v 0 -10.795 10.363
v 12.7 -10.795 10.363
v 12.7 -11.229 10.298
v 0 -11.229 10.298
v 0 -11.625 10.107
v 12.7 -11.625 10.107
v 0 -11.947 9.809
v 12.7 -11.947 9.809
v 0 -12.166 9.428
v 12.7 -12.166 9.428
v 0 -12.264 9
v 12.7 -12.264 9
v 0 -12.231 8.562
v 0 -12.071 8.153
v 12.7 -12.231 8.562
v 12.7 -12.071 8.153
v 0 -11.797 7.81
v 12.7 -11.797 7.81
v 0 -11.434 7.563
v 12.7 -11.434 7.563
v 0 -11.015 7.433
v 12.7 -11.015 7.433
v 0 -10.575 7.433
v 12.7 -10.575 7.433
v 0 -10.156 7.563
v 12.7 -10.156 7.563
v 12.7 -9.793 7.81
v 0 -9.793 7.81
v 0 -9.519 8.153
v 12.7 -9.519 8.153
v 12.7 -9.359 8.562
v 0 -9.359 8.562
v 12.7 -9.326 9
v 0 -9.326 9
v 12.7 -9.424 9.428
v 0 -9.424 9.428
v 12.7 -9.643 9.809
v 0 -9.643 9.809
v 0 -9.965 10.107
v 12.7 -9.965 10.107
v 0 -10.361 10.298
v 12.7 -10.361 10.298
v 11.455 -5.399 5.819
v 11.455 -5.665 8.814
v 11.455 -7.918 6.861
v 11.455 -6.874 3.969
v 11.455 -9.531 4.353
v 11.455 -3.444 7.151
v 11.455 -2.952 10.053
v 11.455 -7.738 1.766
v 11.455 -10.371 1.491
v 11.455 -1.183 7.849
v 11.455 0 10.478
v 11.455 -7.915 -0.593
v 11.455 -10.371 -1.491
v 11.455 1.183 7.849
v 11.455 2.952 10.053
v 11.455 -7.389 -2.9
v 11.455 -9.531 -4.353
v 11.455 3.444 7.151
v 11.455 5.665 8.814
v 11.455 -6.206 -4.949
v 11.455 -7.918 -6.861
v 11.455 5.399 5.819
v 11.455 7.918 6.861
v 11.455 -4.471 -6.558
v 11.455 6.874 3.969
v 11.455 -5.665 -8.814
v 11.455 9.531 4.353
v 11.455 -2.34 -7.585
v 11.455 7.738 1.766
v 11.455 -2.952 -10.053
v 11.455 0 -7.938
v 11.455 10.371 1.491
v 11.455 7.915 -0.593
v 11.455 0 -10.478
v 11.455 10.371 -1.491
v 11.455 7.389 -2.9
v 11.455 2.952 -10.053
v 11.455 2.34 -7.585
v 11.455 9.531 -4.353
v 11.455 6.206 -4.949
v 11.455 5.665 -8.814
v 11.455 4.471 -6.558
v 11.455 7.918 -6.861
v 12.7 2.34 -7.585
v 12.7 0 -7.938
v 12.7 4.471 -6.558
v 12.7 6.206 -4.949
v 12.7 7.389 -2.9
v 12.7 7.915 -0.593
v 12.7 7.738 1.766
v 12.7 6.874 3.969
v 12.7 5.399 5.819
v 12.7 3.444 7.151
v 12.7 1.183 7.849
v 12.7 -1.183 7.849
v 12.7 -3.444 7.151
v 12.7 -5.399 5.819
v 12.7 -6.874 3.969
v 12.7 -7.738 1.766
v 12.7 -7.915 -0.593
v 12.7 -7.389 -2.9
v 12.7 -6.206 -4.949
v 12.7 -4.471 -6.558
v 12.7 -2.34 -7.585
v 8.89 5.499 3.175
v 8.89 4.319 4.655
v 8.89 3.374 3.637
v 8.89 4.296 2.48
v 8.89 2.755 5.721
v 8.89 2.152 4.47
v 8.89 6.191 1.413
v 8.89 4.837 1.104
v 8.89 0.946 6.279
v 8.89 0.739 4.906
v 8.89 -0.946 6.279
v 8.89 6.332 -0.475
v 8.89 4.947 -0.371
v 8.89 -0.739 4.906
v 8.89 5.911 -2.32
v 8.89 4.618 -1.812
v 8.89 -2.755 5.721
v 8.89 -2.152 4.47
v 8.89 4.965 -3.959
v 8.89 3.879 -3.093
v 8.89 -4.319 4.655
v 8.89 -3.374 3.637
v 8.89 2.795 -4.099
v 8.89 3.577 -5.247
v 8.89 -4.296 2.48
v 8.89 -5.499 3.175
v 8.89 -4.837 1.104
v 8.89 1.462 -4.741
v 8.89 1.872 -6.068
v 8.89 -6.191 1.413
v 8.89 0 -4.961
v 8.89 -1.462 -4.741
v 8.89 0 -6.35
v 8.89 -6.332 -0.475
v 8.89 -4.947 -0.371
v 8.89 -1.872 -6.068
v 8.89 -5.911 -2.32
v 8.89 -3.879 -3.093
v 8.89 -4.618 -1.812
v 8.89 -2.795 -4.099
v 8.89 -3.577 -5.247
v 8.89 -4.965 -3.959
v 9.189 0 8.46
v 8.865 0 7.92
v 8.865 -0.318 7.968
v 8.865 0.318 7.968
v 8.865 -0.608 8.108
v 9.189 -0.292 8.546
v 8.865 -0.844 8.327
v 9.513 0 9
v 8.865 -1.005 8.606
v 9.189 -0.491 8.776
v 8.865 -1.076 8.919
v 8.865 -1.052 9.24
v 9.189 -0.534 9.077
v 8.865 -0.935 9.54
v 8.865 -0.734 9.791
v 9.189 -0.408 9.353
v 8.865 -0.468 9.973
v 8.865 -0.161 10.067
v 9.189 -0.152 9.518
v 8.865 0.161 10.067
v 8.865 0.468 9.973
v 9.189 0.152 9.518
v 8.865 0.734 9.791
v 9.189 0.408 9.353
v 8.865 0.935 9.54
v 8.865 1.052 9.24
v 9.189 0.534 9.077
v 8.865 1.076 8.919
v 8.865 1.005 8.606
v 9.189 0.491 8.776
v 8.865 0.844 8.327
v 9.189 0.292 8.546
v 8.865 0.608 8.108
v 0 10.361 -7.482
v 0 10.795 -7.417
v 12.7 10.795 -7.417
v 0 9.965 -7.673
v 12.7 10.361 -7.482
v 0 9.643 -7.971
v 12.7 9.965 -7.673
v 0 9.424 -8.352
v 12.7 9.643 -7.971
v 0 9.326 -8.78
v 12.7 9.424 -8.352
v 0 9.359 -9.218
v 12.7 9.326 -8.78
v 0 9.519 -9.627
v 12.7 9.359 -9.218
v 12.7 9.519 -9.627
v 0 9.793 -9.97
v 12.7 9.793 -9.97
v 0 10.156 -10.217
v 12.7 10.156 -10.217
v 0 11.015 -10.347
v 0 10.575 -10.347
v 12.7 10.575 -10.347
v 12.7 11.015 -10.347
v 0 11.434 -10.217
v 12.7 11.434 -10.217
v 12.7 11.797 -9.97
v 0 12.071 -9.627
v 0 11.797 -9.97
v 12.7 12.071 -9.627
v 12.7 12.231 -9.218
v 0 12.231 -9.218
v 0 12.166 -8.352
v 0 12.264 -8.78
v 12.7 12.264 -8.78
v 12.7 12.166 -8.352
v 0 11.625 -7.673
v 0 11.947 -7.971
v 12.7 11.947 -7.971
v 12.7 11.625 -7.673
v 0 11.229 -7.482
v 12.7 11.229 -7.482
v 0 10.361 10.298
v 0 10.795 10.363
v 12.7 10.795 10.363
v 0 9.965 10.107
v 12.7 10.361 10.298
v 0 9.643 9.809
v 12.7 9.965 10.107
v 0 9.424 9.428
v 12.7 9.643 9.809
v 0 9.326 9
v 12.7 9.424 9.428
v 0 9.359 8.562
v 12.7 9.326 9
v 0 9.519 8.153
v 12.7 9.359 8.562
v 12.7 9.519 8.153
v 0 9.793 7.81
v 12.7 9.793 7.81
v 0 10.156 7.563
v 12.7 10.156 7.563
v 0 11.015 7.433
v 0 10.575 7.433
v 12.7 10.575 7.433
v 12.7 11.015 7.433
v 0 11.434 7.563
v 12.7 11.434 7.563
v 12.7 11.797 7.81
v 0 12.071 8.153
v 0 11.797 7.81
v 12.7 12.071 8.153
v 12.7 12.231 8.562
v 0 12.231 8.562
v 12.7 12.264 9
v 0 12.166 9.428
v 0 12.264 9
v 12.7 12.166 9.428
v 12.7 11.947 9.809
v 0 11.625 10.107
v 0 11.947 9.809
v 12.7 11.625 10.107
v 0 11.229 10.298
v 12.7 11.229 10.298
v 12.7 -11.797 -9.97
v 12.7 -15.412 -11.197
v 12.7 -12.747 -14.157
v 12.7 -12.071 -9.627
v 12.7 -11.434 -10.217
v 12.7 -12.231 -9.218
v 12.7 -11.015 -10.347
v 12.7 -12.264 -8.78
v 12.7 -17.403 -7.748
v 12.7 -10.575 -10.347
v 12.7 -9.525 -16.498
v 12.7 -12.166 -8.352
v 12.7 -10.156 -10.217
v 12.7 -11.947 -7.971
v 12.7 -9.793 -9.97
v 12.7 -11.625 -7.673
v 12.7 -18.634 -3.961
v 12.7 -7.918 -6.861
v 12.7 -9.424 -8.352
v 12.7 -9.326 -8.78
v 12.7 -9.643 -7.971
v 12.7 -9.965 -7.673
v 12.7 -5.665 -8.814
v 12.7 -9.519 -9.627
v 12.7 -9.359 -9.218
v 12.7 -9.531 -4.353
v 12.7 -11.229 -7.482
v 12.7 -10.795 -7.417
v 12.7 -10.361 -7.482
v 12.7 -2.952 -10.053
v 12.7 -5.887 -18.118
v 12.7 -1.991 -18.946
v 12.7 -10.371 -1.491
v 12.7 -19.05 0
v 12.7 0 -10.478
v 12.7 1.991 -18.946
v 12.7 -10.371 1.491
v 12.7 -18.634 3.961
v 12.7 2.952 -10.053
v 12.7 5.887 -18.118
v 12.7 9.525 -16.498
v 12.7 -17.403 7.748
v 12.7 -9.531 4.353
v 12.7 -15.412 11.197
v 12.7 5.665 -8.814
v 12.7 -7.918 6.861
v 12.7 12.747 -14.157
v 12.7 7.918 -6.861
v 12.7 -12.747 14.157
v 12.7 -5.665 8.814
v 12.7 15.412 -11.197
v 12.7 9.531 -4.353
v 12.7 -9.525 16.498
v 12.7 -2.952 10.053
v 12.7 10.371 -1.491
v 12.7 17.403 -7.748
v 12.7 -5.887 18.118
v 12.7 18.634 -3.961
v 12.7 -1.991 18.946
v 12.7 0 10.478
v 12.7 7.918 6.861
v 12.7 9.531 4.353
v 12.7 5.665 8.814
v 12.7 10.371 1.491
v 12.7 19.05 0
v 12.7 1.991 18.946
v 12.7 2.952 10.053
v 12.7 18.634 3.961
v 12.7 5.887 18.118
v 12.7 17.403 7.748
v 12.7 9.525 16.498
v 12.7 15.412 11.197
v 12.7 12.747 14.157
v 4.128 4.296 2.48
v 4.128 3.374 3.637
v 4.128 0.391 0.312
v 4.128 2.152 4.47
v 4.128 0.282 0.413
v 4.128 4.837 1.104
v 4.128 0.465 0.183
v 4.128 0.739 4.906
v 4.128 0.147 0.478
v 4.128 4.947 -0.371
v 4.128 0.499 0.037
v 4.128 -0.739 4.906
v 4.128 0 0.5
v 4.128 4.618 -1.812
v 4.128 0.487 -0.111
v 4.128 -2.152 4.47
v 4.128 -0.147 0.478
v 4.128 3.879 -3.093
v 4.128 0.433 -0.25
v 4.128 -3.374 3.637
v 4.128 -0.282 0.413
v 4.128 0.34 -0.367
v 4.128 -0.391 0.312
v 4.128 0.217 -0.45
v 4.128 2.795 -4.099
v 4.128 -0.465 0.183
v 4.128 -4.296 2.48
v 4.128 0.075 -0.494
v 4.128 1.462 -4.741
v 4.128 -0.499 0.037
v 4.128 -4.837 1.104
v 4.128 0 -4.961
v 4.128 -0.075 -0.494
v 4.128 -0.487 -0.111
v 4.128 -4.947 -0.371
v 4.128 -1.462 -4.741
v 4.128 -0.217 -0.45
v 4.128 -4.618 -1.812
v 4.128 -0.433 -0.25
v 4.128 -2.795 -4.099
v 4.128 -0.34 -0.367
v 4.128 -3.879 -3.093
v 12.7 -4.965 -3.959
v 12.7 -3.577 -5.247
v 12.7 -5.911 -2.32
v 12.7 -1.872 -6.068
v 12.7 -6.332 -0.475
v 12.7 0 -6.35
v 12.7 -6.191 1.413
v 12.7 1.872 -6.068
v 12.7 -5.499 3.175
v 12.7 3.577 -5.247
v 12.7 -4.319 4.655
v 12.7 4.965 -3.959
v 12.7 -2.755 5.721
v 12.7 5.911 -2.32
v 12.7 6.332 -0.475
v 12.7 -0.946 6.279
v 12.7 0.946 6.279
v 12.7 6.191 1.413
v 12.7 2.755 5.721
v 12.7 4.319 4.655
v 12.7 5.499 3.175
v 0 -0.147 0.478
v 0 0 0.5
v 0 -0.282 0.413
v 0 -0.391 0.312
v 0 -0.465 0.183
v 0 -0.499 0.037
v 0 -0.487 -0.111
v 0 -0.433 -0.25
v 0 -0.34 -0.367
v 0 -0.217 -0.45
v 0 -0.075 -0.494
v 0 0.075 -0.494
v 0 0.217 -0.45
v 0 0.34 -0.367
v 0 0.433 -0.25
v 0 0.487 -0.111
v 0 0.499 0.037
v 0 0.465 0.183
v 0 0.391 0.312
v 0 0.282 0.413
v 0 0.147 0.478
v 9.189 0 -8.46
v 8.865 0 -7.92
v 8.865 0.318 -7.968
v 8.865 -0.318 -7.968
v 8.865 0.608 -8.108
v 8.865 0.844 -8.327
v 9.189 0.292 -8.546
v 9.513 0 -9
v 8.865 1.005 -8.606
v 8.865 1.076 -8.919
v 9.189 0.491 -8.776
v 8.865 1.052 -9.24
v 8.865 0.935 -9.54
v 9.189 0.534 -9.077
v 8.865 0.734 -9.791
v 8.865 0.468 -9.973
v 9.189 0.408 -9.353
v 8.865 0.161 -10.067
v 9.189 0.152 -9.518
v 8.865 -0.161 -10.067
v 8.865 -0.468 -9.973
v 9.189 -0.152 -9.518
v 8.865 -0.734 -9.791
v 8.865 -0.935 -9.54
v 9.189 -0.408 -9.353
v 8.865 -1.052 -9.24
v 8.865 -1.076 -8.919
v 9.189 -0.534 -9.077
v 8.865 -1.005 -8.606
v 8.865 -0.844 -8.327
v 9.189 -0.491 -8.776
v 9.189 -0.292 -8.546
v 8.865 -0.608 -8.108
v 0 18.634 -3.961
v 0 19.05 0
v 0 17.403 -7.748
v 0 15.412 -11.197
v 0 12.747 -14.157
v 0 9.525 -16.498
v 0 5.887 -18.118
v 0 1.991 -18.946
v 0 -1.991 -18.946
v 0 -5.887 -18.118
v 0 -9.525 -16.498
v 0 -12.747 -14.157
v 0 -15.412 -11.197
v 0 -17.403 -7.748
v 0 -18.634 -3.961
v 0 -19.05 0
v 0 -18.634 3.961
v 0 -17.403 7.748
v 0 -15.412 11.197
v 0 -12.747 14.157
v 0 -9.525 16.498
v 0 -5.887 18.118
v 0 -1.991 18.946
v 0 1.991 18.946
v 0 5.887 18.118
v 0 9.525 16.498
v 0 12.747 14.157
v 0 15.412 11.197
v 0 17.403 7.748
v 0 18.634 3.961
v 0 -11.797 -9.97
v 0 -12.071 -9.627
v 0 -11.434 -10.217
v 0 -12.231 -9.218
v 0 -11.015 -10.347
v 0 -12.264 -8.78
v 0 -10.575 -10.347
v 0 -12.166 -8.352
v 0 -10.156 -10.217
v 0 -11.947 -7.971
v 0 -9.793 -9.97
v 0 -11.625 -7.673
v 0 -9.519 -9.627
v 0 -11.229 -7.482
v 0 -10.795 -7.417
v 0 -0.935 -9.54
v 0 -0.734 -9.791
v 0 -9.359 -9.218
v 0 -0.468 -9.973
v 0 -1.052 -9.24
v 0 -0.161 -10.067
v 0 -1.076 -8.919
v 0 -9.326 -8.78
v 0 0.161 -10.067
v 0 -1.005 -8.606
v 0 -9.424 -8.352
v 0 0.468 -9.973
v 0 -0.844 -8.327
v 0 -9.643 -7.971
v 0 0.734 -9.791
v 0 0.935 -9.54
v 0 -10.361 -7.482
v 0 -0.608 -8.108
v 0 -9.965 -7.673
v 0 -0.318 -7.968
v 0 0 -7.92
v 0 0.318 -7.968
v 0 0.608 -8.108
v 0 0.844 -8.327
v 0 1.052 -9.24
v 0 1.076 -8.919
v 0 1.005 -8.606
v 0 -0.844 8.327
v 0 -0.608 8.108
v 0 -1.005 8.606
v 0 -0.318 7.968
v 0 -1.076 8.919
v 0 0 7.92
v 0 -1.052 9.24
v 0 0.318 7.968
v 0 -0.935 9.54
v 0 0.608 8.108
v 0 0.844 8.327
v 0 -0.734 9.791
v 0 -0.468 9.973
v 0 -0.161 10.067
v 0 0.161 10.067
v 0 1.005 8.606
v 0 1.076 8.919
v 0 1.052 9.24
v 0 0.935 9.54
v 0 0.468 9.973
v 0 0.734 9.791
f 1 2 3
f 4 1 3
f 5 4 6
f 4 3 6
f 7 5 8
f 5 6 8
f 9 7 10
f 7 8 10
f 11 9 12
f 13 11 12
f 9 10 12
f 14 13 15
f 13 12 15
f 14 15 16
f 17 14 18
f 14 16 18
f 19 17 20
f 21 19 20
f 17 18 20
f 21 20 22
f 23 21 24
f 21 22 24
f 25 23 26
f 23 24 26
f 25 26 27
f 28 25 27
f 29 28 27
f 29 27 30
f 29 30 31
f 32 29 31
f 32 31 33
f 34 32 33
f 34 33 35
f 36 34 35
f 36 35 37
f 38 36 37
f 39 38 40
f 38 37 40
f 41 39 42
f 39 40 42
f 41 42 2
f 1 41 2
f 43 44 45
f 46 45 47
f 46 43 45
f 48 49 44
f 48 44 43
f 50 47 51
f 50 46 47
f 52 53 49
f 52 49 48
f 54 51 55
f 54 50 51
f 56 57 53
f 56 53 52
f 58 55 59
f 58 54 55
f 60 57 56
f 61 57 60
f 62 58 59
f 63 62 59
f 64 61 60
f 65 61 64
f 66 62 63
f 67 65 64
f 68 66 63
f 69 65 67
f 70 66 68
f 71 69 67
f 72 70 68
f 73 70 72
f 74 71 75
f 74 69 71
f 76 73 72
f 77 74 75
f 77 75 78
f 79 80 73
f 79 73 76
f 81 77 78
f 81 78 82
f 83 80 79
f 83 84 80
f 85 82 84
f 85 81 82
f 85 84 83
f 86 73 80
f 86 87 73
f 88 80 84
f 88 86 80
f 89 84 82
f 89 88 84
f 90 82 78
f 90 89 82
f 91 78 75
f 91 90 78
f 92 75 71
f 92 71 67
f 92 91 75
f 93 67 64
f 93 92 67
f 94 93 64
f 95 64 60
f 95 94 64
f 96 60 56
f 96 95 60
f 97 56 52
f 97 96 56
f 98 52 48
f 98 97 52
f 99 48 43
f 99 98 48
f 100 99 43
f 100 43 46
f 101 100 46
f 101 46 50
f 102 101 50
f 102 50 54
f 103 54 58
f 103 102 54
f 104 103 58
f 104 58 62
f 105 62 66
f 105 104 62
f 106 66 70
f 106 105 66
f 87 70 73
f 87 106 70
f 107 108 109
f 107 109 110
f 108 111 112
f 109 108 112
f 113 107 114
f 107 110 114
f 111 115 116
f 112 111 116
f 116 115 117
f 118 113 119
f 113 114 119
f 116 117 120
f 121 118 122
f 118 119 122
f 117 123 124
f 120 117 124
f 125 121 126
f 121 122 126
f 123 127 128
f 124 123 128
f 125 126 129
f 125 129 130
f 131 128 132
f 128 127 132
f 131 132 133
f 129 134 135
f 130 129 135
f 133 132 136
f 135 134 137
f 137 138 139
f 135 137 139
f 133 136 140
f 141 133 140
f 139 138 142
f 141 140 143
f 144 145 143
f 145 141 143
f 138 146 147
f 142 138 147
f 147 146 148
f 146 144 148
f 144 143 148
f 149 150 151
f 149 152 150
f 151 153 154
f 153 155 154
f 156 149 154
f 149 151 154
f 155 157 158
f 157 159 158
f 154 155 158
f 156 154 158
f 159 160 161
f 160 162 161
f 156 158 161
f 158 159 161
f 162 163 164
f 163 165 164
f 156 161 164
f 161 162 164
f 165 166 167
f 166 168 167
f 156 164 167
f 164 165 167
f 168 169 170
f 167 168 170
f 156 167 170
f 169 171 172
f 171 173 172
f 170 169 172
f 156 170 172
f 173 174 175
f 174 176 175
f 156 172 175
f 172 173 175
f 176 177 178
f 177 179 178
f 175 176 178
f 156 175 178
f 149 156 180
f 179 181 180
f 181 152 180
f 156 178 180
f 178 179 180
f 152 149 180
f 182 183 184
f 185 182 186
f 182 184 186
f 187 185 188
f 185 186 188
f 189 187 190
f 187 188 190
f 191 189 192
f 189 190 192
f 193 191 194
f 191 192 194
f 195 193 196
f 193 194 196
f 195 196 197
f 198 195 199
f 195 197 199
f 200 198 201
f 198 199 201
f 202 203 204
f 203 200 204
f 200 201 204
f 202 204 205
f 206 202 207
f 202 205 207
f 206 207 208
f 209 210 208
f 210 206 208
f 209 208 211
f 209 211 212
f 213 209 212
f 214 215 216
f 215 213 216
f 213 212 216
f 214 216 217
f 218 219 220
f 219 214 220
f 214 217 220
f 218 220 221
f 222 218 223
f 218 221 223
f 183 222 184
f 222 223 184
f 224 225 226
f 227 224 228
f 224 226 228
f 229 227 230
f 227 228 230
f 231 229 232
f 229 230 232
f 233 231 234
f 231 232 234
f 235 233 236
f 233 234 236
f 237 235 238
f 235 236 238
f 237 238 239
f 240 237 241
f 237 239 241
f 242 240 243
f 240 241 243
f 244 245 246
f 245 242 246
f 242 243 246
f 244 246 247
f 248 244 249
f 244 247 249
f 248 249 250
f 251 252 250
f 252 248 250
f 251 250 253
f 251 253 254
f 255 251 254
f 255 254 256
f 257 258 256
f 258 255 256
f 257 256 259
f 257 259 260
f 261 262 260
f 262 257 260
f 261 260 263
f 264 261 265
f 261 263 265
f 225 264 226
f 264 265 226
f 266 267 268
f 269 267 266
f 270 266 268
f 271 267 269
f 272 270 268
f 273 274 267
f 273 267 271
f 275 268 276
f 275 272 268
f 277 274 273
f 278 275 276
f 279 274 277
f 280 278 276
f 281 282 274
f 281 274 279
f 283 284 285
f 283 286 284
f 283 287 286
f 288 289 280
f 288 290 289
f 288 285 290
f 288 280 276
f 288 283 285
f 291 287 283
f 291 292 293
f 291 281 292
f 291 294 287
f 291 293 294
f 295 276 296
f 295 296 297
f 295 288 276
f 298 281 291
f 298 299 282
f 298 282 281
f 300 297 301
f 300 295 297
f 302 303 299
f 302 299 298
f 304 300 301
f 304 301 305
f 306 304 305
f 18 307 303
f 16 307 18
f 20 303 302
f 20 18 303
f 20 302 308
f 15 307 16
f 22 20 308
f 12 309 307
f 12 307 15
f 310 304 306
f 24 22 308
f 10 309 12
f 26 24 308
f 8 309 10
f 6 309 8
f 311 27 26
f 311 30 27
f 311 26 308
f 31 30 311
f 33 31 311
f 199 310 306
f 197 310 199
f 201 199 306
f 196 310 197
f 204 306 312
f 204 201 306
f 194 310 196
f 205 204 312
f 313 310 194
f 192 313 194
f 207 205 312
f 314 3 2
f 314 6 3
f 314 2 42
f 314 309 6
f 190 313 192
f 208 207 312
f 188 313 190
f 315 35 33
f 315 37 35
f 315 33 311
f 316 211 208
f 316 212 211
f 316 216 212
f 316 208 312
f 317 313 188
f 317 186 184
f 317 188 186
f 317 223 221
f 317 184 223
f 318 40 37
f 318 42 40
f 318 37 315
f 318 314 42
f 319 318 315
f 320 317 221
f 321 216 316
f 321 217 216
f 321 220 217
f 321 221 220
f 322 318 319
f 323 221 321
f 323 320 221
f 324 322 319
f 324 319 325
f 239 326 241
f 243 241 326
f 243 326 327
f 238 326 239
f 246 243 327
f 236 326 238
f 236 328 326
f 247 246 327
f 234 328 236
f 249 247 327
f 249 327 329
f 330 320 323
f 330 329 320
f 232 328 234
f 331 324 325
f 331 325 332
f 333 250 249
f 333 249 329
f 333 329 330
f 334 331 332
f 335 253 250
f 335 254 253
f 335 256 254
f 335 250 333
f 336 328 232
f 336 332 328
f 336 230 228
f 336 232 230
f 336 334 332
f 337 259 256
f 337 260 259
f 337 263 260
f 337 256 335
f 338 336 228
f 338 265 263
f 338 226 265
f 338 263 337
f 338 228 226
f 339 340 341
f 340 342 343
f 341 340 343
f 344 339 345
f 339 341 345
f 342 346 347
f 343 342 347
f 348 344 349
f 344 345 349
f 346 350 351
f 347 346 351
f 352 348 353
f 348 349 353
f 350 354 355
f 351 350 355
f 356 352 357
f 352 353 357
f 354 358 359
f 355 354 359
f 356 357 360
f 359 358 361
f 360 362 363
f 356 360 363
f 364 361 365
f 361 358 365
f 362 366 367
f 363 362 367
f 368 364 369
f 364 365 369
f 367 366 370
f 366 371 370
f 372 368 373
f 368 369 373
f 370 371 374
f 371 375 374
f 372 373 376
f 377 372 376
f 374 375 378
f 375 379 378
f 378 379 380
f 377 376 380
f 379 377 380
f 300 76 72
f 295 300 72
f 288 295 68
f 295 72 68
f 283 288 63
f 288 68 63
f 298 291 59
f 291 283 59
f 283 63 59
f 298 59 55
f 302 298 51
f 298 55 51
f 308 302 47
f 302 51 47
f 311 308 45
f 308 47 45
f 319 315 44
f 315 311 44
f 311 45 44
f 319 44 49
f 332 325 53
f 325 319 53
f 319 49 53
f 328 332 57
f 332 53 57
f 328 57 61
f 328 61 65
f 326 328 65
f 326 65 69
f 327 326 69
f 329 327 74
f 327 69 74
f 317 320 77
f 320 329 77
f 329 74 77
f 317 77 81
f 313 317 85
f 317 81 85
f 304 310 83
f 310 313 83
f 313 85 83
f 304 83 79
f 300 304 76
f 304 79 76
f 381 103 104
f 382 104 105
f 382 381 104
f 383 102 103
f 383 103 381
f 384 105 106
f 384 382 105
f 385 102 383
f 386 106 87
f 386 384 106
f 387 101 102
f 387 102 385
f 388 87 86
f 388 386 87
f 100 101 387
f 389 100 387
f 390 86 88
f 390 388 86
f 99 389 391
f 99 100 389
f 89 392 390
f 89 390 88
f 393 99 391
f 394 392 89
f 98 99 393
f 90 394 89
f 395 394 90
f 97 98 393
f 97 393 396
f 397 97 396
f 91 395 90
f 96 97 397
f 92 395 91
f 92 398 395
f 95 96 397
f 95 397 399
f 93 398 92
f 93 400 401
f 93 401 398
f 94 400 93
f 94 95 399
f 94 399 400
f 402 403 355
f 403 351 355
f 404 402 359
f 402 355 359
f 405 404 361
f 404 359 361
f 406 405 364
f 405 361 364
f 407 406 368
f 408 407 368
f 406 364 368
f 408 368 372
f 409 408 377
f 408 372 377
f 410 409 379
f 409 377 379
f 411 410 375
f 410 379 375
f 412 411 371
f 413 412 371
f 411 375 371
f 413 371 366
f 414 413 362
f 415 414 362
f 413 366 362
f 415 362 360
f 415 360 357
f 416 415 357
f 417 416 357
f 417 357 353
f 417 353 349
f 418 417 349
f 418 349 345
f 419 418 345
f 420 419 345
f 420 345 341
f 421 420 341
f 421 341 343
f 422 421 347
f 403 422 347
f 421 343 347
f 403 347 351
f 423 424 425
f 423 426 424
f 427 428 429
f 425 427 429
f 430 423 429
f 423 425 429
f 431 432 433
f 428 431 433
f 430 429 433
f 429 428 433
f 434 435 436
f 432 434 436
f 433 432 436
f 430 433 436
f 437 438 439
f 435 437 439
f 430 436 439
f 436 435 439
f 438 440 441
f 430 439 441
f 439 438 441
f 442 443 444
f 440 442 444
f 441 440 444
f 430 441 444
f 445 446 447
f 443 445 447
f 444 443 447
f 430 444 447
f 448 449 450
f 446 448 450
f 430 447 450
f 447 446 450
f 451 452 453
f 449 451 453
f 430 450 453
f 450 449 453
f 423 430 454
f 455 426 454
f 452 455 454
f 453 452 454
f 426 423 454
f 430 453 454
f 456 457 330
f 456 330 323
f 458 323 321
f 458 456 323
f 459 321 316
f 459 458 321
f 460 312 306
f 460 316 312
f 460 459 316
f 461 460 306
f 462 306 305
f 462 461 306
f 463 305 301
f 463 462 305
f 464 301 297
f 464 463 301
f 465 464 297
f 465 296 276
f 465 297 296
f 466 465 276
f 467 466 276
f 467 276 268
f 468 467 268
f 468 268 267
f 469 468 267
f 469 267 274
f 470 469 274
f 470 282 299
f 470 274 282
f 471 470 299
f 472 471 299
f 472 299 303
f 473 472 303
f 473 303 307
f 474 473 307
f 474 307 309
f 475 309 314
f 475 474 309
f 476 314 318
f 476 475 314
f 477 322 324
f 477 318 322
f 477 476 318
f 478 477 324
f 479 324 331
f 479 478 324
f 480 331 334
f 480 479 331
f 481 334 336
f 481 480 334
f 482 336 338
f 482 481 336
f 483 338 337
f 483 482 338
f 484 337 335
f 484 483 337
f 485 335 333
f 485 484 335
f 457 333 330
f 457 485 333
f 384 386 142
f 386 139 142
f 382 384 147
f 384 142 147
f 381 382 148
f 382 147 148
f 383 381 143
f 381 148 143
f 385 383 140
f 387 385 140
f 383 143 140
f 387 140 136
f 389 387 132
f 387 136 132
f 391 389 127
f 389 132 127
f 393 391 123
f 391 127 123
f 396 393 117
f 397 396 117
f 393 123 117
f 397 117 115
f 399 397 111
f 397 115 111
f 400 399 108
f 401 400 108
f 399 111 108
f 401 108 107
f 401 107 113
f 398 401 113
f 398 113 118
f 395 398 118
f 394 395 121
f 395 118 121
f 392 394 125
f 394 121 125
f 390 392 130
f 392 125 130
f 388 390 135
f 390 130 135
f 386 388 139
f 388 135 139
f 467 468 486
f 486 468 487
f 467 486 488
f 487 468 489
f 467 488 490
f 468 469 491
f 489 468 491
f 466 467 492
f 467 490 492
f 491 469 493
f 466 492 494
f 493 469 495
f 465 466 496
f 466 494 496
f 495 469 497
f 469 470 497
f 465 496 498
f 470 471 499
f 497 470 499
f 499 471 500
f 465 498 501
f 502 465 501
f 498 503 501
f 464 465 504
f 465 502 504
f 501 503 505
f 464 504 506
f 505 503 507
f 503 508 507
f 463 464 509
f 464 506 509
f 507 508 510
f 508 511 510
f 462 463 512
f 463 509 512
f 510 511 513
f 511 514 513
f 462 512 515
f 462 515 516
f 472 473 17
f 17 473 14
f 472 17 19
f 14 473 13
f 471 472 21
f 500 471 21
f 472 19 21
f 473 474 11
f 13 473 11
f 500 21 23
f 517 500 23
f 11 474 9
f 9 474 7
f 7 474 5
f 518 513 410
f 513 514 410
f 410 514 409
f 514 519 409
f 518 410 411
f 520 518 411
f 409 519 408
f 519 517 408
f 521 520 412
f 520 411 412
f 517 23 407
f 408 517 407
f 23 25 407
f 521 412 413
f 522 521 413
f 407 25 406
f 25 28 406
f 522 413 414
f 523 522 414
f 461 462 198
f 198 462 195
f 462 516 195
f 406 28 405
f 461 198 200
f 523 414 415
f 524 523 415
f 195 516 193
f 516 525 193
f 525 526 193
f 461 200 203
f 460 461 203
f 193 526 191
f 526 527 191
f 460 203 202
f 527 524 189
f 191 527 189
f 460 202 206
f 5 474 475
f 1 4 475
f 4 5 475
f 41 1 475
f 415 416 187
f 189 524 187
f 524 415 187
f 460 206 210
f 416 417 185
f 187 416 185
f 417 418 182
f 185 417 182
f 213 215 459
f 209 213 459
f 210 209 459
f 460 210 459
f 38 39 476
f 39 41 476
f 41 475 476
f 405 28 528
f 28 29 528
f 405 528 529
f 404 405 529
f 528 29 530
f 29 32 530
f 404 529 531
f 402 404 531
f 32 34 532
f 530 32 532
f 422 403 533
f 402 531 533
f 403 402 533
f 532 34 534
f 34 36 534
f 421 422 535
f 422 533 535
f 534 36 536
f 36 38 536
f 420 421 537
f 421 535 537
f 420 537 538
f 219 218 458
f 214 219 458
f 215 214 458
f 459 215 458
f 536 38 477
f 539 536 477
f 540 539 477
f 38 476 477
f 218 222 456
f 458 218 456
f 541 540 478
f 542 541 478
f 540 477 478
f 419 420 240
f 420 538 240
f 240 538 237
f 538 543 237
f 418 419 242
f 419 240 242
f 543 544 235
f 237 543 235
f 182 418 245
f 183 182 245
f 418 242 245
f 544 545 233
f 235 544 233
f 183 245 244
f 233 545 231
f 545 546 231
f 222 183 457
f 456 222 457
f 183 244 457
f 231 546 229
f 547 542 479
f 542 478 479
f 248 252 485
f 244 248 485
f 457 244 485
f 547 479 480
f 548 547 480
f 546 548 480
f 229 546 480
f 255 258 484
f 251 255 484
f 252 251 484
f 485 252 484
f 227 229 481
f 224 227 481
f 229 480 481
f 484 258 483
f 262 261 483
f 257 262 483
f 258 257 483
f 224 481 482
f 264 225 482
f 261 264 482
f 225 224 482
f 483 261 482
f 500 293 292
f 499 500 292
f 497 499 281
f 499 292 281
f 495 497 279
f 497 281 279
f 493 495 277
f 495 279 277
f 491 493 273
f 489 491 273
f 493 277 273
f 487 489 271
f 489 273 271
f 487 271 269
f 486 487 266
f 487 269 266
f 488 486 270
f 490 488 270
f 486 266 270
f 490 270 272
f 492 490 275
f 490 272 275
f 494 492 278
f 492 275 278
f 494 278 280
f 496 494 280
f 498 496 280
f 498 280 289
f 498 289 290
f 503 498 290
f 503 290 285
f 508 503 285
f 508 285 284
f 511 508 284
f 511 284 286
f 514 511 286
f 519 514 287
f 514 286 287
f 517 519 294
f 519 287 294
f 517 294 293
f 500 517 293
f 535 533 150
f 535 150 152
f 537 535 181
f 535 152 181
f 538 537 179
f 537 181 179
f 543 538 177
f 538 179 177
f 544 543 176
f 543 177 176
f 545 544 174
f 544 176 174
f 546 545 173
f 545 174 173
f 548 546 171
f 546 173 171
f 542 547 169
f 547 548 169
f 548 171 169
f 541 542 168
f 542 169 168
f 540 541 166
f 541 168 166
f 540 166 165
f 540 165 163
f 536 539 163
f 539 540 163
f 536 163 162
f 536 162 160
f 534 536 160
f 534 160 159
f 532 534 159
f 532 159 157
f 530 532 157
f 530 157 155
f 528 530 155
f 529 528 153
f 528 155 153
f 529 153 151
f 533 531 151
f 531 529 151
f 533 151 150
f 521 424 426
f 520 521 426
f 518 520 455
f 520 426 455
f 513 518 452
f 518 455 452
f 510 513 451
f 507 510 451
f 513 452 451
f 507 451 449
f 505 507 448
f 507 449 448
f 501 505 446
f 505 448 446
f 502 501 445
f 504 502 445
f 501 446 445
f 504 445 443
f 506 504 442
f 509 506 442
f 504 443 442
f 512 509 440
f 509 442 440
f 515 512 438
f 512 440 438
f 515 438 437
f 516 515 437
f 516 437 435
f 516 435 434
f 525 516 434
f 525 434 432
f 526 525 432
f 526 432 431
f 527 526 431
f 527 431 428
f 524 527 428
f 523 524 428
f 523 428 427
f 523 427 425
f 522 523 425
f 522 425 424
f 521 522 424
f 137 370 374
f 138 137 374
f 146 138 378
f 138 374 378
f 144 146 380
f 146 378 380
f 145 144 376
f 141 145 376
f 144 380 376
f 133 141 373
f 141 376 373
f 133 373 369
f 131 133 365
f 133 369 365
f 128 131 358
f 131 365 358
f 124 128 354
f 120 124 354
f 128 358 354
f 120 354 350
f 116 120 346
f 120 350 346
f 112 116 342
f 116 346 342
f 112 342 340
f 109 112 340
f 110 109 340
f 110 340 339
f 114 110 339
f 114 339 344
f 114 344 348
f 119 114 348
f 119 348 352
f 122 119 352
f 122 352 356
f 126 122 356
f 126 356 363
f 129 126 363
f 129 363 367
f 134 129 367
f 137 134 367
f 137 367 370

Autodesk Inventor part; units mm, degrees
ref_plane "YZ Plane" through (0, 0, 0) normal (1, 0, 0) x (0, 1, 0)
sketch "Sketch1" plane through (0, 0, 0) normal (1, 0, 0) x (0, 1, 0)
  circle A0 centre (0, 0) radius 19.05
  dimension "d0" = 38.1
extrude "Extrusion1" add sketch "Sketch1" along normal blind 12.7
sketch "Sketch10" plane through (12.7, 0, 0) normal (1, 0, 0) x (0, 0, -1)
  point P0 (0, 0)
  point P1 (0, 0)
hole "Hole4" at (12.7, 0, 0) direction (-1, 0, 0) diameter 12.7 depth 3.81
ref_plane "Work Plane2" through (8.89, 0, 0) normal (1, 0, 0) x (0, 0, -1)
hole "Hole1" at (8.89, 0, 0) direction (-1, 0, 0) diameter 9.9219 depth 4.7625
ref_plane "Work Plane1" through (-12.7, 0, 0) normal (1, 0, 0) x (0, 0, -1)
sketch "Sketch5" plane through (0, 0, 0) normal (1, 0, 0) x (0, 1, 0)
  line L0 (0, 9) -> (0, -9)
  circle A0 centre (0, 0) radius 19.05 projected
  line L1 (-10.795, 0) -> (10.795, 0)
  line L2 (-10.795, 8.89) -> (-10.795, -8.89)
  dimension "d37" = 18
  dimension "d45" = 21.59
  dimension "d46" = 17.78
hole "Hole2" at (0, 0, -9) direction (1, 0, 0) diameter 2.159 depth 8.8646 tip angle 118
sketch "Sketch6" plane through (0, 0, 0) normal (-1, 0, 0) x (0, 0, 1)
  circle A0 centre (0, 0) radius 0.5715
  dimension "d34" = 1.143
hole "Hole5" at (0, 0, 0) direction (1, 0, 0) diameter 1 end through all
mirror "Mirror1" about plane through (0, 0, 0) normal (0, 0, 1) of "Hole2"
hole "Hole3" at (0, -10.795, 8.89) at (0, -10.795, -8.89) direction (1, 0, 0) diameter 2.9464 end through all clearance for "Flat Head Machine Screw (82)" size "#4" standard "Ansi Unified Screw Threads"
mirror "Mirror2" about plane through (0, 0, 0) normal (0, 1, 0) of "Hole3"
sketch "Sketch9" plane through (0, 0, 0) normal (0, 1, 0) x (-1, 0, 0)
  line L0 (-11.4554, -7.9375) -> (-12.7, -7.9375)
  line L1 (-12.7, -7.9375) -> (-12.7, -10.4775)
  line L2 (-12.7, -10.4775) -> (-11.4554, -10.4775)
  line L3 (-11.4554, -10.4775) -> (-11.4554, -7.9375)
  line L4 (2.54, 0) -> (-15.24, 0) projected
  line L5 (-12.7, 19.05) -> (-12.7, -19.05) projected
  point P0 (0, 0)
  dimension "d55" = 2.54
  dimension "d56" = 1.2446
  dimension "d59" = 7.9375
revolve "Revolution1" cut sketch "Sketch9" angle 360 about axis through (-10, 0, 0) along (1, 0, 0)
properties part number "0.375 in hole" material "Aluminum 6061"
